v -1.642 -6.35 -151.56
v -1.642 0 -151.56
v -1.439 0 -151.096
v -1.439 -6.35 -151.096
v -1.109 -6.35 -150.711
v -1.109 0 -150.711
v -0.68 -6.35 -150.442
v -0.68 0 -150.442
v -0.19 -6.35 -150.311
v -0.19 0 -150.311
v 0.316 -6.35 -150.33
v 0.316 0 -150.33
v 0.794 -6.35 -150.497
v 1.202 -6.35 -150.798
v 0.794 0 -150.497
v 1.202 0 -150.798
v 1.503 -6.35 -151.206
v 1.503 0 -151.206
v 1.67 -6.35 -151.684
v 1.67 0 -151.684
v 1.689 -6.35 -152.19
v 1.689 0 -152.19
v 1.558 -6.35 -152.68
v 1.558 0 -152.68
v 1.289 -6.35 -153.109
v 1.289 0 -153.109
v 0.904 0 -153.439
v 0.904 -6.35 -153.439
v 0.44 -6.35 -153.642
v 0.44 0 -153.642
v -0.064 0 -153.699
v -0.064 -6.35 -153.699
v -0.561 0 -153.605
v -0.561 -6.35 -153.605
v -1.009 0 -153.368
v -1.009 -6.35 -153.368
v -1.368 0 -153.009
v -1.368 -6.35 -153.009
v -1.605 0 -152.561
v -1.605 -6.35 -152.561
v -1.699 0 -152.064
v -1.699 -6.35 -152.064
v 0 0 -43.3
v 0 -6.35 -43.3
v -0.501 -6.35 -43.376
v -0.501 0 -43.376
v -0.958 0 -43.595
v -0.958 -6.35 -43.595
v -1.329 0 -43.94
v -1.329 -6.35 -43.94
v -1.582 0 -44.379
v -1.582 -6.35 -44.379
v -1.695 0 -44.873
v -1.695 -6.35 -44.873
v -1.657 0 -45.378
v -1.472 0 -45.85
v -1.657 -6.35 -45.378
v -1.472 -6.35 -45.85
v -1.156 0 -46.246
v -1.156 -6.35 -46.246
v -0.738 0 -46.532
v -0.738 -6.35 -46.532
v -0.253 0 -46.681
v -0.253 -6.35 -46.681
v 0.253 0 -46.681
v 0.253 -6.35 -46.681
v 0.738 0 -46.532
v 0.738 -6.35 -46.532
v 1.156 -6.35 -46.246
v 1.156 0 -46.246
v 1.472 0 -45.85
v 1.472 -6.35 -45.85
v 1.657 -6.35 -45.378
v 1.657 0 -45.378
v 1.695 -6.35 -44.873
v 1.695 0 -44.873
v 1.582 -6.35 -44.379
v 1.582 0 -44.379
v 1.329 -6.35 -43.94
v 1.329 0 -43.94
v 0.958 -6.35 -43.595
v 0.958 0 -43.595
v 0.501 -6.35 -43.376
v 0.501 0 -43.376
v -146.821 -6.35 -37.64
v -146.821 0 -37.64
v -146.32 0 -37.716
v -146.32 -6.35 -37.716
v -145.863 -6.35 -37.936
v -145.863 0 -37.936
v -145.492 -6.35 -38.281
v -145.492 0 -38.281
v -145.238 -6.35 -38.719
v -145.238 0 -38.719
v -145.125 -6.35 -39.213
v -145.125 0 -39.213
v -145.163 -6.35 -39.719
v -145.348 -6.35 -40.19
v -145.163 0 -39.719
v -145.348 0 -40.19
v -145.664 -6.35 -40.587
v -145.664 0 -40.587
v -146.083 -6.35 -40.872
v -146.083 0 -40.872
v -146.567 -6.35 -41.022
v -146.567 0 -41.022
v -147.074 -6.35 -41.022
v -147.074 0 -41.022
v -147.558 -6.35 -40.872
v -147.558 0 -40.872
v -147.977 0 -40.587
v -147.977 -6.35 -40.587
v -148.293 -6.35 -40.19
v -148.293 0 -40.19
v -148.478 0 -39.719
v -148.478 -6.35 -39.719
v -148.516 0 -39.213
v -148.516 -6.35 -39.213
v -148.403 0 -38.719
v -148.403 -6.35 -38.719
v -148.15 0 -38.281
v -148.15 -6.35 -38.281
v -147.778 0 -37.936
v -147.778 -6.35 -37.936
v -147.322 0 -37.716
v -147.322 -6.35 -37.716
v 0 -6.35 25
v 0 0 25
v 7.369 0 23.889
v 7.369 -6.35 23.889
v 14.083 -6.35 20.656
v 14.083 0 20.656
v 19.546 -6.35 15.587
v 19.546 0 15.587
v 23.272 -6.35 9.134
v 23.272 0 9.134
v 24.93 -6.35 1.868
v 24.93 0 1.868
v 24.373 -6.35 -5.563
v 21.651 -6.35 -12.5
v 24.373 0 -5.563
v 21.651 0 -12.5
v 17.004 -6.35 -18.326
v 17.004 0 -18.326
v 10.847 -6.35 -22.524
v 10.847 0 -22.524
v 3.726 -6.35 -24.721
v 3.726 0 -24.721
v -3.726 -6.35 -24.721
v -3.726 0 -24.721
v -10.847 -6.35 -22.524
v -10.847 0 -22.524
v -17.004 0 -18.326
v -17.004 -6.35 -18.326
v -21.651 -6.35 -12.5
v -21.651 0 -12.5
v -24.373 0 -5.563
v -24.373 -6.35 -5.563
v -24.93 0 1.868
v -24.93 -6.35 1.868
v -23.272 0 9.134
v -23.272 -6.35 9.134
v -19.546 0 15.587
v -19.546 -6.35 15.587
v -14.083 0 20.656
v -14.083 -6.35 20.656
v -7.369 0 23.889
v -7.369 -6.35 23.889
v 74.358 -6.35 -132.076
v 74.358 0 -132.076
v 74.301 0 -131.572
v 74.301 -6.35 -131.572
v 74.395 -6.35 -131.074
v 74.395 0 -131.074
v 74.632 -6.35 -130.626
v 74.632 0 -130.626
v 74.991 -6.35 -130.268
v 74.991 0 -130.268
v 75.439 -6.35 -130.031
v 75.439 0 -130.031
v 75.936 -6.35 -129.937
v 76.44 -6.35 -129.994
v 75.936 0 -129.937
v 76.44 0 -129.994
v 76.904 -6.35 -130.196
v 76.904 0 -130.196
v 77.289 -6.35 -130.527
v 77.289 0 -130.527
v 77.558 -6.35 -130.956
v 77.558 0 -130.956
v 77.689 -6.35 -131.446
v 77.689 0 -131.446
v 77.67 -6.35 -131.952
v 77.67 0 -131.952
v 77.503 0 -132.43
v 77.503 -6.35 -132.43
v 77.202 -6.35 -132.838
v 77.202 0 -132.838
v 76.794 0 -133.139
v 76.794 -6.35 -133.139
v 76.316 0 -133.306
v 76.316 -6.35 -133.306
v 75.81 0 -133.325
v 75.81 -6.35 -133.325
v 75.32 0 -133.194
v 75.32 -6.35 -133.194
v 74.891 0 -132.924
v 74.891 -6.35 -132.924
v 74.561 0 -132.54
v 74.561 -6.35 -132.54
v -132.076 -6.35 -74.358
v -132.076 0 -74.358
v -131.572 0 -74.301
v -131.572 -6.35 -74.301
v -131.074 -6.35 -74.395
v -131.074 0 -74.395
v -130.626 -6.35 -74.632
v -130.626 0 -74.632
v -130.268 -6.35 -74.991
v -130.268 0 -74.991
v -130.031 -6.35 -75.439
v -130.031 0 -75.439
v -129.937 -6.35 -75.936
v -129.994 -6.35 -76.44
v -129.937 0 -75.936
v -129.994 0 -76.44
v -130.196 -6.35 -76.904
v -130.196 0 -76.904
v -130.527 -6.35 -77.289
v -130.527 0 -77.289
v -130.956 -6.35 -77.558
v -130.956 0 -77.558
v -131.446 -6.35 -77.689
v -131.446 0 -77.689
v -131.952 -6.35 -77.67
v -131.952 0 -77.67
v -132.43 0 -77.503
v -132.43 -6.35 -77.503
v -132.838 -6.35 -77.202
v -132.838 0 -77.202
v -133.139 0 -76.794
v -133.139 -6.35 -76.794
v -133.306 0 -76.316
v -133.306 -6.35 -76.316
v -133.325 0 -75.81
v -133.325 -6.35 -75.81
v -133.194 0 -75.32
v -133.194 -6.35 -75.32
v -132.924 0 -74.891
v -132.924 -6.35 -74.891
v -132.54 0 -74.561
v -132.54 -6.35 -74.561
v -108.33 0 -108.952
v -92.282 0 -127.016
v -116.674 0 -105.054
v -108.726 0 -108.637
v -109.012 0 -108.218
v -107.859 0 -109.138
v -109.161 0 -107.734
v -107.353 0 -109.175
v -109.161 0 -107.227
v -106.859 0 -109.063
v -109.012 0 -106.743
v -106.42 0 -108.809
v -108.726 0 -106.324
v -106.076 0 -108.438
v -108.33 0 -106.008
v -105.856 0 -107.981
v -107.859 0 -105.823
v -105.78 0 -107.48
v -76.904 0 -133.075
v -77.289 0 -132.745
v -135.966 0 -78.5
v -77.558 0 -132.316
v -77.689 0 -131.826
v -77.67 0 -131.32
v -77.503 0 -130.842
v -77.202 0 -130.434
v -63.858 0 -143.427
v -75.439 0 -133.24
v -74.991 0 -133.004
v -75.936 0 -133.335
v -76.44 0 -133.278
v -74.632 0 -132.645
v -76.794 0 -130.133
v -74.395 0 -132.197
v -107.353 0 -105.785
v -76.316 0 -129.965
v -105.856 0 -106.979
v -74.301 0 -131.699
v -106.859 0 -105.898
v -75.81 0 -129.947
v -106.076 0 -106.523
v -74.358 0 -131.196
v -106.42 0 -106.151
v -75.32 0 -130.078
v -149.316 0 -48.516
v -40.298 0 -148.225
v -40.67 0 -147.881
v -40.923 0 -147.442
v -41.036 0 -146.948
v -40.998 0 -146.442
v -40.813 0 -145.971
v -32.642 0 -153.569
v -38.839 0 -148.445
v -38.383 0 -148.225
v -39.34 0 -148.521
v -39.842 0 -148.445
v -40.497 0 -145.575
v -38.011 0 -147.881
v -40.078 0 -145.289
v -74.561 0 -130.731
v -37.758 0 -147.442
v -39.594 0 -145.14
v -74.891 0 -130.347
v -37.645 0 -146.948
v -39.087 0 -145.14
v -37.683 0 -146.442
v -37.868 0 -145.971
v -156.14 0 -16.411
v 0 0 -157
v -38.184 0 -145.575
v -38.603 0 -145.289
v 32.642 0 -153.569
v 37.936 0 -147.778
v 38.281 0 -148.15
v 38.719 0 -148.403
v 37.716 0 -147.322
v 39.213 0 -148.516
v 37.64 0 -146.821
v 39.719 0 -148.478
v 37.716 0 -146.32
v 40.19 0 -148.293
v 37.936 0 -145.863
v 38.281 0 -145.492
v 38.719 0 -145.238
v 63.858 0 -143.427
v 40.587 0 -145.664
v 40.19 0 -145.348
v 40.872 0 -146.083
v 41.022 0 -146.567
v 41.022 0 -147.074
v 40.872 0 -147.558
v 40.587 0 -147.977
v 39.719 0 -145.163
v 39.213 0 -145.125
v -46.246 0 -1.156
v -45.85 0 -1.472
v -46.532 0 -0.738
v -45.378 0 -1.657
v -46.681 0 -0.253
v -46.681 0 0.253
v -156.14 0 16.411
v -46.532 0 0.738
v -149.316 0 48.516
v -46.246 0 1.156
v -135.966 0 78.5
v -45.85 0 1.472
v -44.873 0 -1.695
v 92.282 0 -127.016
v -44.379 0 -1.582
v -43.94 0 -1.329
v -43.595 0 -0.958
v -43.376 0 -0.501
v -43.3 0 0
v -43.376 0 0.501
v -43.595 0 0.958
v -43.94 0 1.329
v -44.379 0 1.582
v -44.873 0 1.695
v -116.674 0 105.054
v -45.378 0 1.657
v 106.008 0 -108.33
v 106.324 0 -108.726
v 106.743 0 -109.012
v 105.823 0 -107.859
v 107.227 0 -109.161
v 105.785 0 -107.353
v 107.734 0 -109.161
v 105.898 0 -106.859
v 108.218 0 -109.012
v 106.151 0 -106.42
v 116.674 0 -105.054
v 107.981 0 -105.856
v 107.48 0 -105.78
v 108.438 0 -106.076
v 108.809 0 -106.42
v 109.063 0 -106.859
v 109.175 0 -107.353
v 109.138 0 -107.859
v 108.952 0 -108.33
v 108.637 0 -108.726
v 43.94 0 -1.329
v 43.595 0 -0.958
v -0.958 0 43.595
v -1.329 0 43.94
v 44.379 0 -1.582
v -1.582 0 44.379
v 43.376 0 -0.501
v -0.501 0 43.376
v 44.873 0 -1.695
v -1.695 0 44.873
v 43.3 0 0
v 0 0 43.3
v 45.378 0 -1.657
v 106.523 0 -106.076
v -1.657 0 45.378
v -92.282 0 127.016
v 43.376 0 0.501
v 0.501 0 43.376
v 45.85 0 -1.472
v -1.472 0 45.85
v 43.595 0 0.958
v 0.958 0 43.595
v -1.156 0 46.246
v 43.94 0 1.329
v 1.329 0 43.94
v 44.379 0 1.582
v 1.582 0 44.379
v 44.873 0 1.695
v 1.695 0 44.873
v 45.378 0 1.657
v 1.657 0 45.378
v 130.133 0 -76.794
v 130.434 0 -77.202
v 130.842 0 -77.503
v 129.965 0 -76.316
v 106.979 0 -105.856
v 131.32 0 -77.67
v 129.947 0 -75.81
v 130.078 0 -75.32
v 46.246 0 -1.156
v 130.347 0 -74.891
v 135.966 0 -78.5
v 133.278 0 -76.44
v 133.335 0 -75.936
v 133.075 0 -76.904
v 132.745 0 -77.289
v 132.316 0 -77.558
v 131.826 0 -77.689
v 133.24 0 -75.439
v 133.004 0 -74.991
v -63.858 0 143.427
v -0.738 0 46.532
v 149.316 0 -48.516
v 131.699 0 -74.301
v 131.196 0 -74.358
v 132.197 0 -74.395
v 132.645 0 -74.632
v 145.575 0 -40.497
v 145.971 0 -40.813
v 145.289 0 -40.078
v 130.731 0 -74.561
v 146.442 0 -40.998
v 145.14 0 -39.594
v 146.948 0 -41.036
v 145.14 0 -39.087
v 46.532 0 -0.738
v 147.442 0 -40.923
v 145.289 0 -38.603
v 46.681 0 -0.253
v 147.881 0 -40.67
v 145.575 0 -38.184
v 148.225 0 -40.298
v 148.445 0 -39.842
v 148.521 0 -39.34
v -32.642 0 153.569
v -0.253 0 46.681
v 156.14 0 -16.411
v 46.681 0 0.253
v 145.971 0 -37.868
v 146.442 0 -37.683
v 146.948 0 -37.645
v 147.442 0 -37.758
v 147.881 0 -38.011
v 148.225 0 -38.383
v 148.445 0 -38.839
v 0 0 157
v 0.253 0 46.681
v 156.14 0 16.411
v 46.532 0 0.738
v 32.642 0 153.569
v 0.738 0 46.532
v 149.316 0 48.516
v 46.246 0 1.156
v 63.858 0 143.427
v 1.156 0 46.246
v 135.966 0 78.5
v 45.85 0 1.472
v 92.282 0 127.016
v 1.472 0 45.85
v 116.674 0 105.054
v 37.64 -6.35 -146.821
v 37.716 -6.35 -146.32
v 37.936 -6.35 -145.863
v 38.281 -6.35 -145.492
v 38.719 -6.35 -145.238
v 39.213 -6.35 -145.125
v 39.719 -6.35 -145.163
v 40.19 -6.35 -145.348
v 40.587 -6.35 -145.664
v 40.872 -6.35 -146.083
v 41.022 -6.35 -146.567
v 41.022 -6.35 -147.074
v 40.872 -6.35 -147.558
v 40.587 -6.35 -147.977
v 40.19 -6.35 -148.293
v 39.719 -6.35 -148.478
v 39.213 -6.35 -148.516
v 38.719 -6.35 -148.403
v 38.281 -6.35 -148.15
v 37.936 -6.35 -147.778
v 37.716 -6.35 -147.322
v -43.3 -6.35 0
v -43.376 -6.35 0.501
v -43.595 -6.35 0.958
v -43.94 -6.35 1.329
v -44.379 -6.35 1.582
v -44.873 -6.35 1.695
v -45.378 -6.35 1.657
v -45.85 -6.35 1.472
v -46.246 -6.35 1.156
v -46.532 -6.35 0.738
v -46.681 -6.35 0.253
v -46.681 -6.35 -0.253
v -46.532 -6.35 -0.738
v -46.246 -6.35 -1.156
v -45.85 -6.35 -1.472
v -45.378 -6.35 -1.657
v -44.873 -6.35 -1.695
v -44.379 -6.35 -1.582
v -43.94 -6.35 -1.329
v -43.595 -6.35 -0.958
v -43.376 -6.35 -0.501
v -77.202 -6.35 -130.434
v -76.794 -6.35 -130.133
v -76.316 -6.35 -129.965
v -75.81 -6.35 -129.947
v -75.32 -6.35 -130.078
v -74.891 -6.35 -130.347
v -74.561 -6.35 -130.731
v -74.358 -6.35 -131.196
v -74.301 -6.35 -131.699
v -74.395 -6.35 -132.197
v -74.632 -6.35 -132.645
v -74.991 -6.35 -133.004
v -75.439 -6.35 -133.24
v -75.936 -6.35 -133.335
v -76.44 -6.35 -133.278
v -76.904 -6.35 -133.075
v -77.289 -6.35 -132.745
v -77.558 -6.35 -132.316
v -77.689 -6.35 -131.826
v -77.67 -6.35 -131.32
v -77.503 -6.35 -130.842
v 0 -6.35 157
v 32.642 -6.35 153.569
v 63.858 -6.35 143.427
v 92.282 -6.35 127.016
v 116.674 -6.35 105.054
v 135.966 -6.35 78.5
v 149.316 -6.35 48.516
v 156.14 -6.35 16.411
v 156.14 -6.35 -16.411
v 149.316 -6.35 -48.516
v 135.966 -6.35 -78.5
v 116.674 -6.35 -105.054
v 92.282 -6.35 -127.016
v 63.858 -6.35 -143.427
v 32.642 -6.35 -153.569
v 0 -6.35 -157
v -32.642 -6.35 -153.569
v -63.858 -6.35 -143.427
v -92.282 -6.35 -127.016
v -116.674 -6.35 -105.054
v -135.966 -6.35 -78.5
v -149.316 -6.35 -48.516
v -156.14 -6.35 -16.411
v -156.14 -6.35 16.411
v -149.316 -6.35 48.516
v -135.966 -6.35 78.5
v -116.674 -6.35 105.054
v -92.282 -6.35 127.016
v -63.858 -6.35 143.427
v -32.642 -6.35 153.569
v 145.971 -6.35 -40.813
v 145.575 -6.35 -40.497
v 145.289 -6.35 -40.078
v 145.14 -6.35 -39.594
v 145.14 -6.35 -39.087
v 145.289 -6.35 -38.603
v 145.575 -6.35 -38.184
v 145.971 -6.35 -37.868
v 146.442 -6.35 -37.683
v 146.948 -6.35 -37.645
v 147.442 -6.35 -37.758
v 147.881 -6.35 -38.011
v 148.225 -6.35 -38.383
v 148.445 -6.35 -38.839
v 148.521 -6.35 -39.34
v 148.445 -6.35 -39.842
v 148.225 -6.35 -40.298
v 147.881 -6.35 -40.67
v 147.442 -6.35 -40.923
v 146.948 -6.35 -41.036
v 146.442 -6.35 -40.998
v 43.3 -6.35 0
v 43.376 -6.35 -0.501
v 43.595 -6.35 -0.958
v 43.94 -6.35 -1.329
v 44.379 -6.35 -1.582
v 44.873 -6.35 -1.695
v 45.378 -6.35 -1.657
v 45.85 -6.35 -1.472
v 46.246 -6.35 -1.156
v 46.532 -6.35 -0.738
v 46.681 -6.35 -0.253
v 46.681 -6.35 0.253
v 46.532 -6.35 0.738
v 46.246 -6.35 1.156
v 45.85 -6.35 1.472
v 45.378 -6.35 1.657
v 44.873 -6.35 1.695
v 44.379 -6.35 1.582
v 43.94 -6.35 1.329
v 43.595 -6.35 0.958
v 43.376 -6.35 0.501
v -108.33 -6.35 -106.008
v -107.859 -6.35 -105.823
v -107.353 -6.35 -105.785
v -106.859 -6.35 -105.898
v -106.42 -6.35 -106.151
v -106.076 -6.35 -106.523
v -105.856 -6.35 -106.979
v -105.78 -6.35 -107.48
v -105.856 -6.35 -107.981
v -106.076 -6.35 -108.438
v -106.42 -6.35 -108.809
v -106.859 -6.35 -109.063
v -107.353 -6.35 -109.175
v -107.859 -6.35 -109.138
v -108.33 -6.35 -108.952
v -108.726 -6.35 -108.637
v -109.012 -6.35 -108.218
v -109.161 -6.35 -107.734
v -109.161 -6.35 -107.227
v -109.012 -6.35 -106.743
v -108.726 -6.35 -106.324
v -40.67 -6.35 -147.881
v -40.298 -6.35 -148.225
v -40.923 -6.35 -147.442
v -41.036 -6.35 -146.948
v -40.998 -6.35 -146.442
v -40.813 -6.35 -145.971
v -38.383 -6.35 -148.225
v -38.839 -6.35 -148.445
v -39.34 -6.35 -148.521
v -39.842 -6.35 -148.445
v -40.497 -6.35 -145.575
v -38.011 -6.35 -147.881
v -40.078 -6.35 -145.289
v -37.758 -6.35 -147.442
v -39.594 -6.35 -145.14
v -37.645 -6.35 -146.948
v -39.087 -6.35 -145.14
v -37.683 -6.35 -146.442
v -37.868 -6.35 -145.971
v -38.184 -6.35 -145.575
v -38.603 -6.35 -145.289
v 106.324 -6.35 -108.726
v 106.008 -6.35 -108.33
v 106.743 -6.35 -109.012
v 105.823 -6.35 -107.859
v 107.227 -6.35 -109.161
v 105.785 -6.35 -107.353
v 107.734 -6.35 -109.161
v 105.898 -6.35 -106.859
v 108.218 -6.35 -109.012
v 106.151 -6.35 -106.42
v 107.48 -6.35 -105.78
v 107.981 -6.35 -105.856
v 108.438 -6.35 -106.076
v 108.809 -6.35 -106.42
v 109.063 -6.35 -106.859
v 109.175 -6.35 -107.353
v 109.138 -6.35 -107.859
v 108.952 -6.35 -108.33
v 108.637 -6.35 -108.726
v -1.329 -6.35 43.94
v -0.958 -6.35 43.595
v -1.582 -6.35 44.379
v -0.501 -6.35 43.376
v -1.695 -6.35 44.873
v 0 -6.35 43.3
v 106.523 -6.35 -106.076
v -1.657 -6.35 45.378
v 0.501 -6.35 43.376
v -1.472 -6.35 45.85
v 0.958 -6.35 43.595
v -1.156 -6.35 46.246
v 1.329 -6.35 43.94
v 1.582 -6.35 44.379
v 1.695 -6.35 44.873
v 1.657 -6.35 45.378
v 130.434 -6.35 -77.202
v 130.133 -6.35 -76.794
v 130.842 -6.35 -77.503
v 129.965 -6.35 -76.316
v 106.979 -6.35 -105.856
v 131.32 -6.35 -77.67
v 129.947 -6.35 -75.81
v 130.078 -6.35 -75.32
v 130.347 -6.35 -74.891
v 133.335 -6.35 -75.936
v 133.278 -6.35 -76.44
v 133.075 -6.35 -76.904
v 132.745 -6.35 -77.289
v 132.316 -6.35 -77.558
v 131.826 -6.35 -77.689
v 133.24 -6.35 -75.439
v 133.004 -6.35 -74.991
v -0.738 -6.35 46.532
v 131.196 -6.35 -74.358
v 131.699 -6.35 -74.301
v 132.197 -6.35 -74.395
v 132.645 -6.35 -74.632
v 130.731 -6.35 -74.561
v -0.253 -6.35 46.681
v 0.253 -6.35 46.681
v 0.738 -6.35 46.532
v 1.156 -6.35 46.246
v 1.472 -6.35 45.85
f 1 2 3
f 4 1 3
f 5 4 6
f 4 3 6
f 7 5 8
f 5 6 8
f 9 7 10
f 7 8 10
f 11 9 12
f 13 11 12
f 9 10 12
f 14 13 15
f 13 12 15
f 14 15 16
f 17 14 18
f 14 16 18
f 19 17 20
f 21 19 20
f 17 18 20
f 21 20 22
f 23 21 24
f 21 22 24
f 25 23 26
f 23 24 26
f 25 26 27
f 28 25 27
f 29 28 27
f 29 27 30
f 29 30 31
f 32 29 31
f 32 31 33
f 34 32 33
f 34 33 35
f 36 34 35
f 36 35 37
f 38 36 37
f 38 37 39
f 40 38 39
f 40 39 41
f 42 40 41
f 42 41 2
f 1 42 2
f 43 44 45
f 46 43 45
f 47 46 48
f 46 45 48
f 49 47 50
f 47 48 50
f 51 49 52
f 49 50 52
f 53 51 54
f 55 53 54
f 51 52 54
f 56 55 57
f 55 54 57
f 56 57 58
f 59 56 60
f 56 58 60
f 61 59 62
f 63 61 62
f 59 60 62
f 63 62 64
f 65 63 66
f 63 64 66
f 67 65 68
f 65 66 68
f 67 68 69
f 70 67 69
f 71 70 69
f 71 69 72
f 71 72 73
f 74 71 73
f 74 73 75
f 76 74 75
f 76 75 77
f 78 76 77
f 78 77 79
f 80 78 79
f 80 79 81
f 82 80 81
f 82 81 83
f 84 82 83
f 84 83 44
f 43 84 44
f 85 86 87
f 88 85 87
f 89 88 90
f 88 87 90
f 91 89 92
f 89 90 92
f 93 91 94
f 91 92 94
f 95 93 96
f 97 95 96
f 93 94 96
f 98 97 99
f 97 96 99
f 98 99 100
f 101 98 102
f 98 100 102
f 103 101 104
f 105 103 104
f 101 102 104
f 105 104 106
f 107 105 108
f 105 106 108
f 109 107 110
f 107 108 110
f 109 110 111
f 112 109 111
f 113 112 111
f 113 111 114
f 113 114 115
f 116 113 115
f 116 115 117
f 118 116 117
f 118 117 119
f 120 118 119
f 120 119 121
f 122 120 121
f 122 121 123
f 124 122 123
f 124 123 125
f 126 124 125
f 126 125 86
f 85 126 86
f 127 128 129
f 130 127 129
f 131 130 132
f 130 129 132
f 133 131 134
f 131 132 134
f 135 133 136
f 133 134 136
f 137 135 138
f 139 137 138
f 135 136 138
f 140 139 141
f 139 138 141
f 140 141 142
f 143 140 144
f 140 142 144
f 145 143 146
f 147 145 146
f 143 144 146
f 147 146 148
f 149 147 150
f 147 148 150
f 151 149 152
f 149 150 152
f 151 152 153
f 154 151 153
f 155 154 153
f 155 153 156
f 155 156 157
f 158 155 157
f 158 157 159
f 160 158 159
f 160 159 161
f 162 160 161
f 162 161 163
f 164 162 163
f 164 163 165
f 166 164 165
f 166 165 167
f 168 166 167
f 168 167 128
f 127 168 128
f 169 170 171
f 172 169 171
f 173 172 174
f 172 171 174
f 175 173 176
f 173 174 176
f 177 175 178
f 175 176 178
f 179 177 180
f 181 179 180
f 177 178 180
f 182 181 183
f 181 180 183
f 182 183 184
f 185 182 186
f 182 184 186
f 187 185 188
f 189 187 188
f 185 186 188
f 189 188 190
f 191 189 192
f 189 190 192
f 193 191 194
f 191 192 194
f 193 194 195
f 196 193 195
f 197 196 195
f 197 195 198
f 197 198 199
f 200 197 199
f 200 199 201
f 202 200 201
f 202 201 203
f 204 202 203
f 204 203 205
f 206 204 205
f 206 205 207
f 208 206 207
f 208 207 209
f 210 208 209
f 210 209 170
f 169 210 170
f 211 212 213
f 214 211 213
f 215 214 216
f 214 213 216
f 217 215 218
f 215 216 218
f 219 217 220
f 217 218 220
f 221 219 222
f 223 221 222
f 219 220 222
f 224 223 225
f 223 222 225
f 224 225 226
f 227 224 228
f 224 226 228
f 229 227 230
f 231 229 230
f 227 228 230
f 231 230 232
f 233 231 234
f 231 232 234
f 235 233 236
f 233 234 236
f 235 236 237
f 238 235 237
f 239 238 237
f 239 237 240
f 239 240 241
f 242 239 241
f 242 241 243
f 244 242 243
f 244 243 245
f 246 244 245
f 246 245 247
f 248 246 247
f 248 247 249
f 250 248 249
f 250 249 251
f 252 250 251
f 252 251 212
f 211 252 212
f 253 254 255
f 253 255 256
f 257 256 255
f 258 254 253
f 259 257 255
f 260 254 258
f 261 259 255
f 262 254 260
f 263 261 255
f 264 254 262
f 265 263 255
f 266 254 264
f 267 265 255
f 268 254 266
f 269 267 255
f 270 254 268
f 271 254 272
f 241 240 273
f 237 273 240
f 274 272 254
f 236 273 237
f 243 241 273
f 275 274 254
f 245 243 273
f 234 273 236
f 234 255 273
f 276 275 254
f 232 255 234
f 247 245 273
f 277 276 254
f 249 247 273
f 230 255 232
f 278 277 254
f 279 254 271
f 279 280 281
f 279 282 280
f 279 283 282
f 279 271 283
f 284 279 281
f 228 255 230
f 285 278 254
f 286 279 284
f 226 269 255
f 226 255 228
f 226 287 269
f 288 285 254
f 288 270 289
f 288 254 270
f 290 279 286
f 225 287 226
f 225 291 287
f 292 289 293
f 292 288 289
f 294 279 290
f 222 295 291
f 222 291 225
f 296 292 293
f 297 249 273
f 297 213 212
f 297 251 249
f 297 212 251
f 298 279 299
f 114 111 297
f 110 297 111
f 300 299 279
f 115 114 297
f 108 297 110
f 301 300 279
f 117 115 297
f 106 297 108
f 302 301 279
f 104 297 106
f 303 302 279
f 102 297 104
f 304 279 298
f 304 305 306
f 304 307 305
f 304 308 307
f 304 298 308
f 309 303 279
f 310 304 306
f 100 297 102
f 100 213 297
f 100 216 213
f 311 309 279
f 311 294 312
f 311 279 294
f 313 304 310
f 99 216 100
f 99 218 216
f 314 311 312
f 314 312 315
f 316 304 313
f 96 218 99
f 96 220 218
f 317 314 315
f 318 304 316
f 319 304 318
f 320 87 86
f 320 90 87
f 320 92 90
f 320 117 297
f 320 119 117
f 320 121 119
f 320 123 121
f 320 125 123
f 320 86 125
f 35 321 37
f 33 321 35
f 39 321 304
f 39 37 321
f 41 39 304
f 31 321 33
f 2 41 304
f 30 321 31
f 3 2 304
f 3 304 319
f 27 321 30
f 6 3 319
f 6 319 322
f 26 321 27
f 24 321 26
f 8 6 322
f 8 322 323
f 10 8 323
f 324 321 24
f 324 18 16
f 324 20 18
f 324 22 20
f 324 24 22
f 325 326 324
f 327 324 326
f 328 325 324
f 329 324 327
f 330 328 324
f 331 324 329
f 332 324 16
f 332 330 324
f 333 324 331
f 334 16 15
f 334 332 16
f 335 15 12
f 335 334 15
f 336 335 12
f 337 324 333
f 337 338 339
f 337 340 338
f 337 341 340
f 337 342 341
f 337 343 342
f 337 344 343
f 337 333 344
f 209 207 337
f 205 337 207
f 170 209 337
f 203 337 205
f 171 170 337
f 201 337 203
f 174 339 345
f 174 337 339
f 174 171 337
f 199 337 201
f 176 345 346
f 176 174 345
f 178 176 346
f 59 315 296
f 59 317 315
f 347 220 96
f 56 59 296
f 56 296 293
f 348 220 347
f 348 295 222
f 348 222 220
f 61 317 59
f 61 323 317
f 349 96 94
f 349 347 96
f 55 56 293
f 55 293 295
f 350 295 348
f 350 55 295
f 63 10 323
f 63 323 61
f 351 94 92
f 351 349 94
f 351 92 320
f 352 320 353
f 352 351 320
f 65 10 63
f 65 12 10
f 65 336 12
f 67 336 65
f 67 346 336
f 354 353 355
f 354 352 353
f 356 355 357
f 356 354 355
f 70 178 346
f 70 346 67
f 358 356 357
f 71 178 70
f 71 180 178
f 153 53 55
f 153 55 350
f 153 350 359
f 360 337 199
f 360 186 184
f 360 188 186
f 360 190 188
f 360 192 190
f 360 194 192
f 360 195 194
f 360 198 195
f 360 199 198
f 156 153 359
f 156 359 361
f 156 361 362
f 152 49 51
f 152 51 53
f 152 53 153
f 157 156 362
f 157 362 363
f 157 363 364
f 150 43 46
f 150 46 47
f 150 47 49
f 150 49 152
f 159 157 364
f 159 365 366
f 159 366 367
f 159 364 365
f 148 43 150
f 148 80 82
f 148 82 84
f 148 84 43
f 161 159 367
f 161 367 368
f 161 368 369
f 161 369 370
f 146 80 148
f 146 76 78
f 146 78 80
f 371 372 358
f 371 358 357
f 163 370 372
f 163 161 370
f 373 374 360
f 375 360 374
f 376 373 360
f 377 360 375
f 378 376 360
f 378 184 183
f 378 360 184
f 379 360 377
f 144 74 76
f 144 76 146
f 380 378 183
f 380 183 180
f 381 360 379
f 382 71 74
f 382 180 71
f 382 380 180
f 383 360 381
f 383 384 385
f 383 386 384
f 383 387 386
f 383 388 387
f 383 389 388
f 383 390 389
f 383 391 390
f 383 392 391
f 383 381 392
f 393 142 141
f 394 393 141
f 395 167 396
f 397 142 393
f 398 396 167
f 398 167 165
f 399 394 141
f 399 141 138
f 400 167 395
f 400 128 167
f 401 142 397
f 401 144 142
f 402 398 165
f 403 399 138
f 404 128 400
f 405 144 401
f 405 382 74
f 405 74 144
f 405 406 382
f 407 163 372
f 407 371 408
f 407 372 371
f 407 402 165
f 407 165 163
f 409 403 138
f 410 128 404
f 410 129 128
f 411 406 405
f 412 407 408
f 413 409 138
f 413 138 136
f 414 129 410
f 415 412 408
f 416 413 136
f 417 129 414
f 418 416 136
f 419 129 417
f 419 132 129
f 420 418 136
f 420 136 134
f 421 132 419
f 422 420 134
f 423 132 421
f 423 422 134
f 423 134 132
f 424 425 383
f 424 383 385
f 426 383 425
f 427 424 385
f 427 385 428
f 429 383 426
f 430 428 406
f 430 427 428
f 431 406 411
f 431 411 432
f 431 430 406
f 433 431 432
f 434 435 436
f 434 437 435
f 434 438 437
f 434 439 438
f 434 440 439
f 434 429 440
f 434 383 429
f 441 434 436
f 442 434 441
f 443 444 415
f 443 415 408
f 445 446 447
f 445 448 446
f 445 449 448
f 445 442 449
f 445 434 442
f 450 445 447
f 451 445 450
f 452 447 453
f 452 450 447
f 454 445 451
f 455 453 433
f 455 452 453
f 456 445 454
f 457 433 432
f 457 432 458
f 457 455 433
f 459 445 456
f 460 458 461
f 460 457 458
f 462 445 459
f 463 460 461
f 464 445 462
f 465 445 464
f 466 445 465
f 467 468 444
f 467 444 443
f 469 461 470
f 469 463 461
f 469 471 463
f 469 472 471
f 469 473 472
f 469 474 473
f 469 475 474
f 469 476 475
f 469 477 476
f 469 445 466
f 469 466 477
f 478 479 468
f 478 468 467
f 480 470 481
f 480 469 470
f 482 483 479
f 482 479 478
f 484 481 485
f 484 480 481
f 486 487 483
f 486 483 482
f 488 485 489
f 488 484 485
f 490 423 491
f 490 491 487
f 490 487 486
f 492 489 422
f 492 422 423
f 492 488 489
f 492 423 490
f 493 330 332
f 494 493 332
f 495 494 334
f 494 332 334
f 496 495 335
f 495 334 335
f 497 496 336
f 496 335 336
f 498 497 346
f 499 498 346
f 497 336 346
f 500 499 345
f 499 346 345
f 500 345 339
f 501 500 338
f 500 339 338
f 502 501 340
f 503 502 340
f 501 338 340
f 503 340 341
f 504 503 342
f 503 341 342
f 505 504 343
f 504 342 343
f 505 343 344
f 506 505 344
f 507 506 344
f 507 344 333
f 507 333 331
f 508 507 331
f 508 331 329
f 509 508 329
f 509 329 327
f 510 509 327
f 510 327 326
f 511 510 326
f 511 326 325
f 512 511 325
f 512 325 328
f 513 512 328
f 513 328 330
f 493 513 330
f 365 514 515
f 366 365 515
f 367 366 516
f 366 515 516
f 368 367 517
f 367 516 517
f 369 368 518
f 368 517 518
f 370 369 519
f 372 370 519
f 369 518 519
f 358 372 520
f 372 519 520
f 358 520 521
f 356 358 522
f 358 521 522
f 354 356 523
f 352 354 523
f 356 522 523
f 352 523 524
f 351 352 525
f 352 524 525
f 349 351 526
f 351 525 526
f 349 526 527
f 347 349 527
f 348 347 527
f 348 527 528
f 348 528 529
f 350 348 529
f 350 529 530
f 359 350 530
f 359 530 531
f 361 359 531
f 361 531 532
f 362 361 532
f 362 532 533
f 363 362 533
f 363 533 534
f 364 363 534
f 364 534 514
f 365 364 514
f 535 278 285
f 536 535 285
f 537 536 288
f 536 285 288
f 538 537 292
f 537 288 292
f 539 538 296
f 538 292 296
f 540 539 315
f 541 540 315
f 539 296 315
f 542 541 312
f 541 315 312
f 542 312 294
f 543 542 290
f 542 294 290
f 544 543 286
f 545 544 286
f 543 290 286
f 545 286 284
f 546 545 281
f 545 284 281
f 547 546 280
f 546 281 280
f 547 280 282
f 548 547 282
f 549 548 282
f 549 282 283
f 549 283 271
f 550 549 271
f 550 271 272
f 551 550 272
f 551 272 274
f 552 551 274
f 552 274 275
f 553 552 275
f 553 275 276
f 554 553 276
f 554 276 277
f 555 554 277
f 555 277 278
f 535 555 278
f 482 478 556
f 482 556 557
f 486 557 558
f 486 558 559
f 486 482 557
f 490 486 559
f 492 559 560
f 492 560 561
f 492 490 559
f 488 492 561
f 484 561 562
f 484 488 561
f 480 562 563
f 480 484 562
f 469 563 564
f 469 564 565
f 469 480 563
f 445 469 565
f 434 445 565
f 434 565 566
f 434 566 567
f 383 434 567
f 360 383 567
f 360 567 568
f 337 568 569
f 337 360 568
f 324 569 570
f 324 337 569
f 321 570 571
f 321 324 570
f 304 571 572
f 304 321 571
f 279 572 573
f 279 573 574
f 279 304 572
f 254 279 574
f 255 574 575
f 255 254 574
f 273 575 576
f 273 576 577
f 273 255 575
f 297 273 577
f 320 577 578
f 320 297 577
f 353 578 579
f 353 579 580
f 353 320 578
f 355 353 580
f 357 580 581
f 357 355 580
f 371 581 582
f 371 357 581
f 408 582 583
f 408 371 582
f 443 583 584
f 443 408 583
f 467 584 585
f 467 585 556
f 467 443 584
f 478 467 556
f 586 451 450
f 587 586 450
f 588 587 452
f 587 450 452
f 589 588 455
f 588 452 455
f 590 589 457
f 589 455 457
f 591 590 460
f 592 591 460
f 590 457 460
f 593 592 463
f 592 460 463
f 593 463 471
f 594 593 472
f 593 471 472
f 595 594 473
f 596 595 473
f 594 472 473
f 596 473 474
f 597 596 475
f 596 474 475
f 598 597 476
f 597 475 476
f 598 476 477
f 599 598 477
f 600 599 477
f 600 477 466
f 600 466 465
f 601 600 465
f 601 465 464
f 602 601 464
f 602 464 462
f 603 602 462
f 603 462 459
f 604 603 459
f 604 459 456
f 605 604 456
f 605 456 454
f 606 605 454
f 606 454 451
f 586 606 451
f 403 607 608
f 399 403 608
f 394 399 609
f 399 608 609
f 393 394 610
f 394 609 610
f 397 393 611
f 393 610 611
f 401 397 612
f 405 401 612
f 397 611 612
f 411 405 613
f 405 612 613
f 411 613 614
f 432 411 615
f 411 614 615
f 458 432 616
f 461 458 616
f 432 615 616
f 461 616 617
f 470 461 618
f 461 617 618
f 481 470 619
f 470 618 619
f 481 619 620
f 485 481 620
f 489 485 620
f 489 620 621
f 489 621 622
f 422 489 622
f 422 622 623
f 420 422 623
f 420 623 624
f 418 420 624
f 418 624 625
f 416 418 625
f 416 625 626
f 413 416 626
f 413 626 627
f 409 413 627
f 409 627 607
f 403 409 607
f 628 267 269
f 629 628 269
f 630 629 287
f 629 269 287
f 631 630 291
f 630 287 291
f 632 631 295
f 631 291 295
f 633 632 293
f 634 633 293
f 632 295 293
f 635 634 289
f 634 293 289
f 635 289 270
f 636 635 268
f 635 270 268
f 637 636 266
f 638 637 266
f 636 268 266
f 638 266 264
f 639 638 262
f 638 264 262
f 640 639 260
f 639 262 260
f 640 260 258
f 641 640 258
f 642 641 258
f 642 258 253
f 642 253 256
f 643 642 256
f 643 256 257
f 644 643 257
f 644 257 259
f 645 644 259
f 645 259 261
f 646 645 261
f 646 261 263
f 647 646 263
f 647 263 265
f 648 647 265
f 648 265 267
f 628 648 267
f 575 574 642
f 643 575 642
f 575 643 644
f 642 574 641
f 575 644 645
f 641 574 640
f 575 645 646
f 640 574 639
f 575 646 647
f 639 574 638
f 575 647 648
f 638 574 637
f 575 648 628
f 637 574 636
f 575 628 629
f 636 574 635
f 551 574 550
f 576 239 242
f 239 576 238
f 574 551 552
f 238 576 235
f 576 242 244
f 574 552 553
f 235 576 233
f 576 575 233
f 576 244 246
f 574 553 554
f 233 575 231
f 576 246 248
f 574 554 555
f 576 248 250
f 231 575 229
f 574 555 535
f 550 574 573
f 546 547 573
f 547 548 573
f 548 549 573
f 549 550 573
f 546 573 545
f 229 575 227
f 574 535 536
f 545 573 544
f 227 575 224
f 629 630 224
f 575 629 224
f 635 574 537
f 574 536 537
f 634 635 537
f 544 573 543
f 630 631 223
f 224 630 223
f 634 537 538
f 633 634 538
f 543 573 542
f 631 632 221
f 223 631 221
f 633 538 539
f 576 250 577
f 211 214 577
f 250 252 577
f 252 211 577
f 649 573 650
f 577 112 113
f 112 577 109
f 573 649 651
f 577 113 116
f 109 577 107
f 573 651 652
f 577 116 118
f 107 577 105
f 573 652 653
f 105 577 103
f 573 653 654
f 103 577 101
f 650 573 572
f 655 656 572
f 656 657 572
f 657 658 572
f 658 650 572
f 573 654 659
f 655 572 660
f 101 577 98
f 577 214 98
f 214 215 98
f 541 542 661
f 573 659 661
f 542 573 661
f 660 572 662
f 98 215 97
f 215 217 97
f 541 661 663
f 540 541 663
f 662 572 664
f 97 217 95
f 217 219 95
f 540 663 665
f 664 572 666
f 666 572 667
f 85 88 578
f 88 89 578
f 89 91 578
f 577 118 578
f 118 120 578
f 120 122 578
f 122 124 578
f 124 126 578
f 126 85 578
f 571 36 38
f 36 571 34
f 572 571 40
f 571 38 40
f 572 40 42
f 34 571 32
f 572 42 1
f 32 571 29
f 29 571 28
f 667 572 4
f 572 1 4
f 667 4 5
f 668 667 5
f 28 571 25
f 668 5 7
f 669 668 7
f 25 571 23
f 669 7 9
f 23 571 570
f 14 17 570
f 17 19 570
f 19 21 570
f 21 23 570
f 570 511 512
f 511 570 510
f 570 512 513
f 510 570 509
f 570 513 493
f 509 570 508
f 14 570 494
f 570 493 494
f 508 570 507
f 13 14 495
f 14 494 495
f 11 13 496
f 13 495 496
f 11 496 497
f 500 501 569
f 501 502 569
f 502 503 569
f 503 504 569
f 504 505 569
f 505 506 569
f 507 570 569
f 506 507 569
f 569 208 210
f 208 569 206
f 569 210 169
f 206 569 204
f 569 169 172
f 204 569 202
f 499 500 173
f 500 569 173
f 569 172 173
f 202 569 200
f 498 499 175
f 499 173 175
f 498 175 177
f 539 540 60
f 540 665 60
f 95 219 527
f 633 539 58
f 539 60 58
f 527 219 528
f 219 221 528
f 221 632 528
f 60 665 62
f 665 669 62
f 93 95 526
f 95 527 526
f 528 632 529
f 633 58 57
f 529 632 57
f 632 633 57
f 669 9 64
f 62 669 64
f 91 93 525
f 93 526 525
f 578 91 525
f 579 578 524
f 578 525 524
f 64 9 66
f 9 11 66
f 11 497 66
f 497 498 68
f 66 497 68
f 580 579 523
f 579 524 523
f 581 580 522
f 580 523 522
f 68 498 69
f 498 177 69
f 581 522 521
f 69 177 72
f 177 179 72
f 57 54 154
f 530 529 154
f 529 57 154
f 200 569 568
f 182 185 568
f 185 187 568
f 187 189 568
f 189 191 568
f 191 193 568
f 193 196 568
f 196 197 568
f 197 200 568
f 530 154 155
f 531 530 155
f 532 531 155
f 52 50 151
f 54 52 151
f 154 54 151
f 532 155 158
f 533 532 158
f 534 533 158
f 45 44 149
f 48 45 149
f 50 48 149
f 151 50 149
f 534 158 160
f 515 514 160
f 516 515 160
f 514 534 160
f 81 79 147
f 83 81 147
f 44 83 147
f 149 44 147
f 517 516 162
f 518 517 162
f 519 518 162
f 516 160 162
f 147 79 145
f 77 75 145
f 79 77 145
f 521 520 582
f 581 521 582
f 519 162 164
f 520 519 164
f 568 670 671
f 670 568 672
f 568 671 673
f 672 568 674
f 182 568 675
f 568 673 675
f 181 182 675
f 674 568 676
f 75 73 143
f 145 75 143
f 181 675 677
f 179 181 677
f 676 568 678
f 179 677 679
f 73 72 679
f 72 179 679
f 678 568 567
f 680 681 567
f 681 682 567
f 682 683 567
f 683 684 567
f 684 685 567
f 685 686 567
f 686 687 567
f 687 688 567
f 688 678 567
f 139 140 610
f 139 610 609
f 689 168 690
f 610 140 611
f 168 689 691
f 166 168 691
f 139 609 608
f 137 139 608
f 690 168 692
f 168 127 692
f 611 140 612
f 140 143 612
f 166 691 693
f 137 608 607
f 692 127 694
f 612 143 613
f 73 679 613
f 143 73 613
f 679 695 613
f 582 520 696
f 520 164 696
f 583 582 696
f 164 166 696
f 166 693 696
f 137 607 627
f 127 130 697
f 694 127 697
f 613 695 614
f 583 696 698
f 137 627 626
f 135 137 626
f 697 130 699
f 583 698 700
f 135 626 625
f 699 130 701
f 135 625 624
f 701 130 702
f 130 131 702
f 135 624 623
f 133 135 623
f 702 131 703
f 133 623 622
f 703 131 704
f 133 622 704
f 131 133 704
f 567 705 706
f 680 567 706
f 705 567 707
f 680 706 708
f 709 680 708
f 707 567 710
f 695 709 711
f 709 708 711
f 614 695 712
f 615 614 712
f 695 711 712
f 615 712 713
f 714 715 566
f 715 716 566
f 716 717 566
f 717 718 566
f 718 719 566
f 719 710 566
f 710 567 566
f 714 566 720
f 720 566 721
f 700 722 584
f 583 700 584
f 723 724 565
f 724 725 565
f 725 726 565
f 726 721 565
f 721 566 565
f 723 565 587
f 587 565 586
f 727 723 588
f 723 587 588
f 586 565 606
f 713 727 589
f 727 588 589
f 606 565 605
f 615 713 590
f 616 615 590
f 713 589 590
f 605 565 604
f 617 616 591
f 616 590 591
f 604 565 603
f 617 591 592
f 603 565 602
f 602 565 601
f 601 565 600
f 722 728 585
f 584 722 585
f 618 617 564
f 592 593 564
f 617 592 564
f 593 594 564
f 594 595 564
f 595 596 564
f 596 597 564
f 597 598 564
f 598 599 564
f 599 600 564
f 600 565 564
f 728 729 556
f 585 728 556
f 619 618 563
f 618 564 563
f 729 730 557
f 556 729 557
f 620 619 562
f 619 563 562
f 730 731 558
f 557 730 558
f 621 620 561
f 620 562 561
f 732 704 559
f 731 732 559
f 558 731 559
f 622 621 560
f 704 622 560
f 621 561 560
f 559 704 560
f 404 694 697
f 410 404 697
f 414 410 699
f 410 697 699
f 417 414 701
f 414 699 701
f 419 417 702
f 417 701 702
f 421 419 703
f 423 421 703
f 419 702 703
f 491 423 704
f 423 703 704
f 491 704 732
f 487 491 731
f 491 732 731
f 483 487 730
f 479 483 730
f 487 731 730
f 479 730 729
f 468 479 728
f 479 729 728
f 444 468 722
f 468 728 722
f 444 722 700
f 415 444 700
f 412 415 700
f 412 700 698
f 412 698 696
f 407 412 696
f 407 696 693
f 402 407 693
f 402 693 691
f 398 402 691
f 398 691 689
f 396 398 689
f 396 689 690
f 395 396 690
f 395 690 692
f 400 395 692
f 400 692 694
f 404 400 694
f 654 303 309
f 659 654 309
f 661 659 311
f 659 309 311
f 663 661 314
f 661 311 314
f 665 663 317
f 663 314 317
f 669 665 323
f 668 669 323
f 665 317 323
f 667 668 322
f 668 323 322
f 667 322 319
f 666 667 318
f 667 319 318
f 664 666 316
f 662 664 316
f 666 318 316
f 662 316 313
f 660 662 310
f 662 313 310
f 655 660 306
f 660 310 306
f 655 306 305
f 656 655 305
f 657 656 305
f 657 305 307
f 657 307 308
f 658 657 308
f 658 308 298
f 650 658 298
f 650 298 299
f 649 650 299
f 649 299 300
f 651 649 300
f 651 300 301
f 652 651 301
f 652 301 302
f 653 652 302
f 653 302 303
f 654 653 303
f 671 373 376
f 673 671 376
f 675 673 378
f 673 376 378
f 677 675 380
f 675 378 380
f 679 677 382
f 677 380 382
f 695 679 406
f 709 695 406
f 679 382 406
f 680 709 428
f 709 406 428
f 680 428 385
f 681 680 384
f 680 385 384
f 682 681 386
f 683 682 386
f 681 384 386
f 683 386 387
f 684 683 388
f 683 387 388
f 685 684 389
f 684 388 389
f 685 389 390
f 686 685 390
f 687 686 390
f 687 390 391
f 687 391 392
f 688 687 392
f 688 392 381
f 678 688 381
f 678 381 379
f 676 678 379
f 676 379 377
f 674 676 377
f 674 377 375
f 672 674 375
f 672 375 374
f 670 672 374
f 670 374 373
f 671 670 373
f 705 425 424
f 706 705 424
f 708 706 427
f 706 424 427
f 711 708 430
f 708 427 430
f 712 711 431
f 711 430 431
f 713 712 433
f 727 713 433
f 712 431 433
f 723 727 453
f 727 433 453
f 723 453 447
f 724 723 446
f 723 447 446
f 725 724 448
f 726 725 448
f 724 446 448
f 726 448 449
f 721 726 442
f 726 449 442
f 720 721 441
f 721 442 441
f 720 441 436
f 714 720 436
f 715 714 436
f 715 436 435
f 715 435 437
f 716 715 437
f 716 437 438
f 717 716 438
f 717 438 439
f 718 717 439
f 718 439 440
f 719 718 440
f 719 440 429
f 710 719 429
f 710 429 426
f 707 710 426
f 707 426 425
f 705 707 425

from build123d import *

# Parameters (mm, degrees)
SKETCH2_R           = 157
BOSS_EXTRUDE1_DEPTH = 6.35
SKETCH4_R           = 25
CUT_EXTRUDE1_DEPTH  = 223.122314278
SKETCH5_R           = 1.7
CUT_EXTRUDE2_DEPTH  = 223.122314278
CIRPATTERN1_COUNT   = 4
SKETCH7_R           = 1.7
CUT_EXTRUDE4_DEPTH  = 223.122314278
CIRPATTERN2_COUNT   = 11
CIRPATTERN2_ANGLE   = 150


with BuildPart() as part:
    # Sketch2 → Boss-Extrude1 (new body)
    with BuildSketch(Plane(origin=(0, 0, 0), x_dir=(1, 0, 0), z_dir=(0, 1, 0))):
        with Locations(Location((0, 0, 0), (0, 0, 270))):
            Circle(SKETCH2_R)
    extrude(amount=-BOSS_EXTRUDE1_DEPTH)

    # Sketch4 → Cut-Extrude1 (cut, through all)
    with BuildSketch(Plane(origin=(0, 0, 0), x_dir=(1, 0, 0), z_dir=(0, 1, 0))):
        with Locations(Location((0, 0, 0), (0, 0, 270))):
            Circle(SKETCH4_R)
    extrude(amount=-CUT_EXTRUDE1_DEPTH, mode=Mode.SUBTRACT)

    # Sketch5 → Cut-Extrude2 (cut, through all)
    with BuildSketch(Plane.XZ.offset(6.35)):
        with Locations(Location((0, 45, 0), (0, 0, 270))):
            Circle(SKETCH5_R)
    cut_extrude2 = extrude(amount=-CUT_EXTRUDE2_DEPTH, mode=Mode.SUBTRACT)

    # CirPattern1: Cut-Extrude2 ×4 about axis
    cirpattern1_axis = Axis((0, 0, 0), (0, 1, 0))
    for i in range(1, CIRPATTERN1_COUNT):
        add(cut_extrude2.rotate(cirpattern1_axis, i * 360 / CIRPATTERN1_COUNT), mode=Mode.SUBTRACT)

    # Sketch7 → Cut-Extrude4 (cut, through all)
    with BuildSketch(Plane(origin=(0, 0, 0), x_dir=(1, 0, 0), z_dir=(0, 1, 0))):
        with Locations(Location((-146.820725596, 39.340494856, 0), (0, 0, 270))):
            Circle(SKETCH7_R)
    cut_extrude4 = extrude(amount=-CUT_EXTRUDE4_DEPTH, mode=Mode.SUBTRACT)

    # CirPattern2: Cut-Extrude4 ×11 about axis
    cirpattern2_axis = Axis((0, 0, 0), (0, -1, 0))
    for i in range(1, CIRPATTERN2_COUNT):
        add(cut_extrude4.rotate(cirpattern2_axis, i * CIRPATTERN2_ANGLE / (CIRPATTERN2_COUNT - 1)), mode=Mode.SUBTRACT)


solid = part.part
